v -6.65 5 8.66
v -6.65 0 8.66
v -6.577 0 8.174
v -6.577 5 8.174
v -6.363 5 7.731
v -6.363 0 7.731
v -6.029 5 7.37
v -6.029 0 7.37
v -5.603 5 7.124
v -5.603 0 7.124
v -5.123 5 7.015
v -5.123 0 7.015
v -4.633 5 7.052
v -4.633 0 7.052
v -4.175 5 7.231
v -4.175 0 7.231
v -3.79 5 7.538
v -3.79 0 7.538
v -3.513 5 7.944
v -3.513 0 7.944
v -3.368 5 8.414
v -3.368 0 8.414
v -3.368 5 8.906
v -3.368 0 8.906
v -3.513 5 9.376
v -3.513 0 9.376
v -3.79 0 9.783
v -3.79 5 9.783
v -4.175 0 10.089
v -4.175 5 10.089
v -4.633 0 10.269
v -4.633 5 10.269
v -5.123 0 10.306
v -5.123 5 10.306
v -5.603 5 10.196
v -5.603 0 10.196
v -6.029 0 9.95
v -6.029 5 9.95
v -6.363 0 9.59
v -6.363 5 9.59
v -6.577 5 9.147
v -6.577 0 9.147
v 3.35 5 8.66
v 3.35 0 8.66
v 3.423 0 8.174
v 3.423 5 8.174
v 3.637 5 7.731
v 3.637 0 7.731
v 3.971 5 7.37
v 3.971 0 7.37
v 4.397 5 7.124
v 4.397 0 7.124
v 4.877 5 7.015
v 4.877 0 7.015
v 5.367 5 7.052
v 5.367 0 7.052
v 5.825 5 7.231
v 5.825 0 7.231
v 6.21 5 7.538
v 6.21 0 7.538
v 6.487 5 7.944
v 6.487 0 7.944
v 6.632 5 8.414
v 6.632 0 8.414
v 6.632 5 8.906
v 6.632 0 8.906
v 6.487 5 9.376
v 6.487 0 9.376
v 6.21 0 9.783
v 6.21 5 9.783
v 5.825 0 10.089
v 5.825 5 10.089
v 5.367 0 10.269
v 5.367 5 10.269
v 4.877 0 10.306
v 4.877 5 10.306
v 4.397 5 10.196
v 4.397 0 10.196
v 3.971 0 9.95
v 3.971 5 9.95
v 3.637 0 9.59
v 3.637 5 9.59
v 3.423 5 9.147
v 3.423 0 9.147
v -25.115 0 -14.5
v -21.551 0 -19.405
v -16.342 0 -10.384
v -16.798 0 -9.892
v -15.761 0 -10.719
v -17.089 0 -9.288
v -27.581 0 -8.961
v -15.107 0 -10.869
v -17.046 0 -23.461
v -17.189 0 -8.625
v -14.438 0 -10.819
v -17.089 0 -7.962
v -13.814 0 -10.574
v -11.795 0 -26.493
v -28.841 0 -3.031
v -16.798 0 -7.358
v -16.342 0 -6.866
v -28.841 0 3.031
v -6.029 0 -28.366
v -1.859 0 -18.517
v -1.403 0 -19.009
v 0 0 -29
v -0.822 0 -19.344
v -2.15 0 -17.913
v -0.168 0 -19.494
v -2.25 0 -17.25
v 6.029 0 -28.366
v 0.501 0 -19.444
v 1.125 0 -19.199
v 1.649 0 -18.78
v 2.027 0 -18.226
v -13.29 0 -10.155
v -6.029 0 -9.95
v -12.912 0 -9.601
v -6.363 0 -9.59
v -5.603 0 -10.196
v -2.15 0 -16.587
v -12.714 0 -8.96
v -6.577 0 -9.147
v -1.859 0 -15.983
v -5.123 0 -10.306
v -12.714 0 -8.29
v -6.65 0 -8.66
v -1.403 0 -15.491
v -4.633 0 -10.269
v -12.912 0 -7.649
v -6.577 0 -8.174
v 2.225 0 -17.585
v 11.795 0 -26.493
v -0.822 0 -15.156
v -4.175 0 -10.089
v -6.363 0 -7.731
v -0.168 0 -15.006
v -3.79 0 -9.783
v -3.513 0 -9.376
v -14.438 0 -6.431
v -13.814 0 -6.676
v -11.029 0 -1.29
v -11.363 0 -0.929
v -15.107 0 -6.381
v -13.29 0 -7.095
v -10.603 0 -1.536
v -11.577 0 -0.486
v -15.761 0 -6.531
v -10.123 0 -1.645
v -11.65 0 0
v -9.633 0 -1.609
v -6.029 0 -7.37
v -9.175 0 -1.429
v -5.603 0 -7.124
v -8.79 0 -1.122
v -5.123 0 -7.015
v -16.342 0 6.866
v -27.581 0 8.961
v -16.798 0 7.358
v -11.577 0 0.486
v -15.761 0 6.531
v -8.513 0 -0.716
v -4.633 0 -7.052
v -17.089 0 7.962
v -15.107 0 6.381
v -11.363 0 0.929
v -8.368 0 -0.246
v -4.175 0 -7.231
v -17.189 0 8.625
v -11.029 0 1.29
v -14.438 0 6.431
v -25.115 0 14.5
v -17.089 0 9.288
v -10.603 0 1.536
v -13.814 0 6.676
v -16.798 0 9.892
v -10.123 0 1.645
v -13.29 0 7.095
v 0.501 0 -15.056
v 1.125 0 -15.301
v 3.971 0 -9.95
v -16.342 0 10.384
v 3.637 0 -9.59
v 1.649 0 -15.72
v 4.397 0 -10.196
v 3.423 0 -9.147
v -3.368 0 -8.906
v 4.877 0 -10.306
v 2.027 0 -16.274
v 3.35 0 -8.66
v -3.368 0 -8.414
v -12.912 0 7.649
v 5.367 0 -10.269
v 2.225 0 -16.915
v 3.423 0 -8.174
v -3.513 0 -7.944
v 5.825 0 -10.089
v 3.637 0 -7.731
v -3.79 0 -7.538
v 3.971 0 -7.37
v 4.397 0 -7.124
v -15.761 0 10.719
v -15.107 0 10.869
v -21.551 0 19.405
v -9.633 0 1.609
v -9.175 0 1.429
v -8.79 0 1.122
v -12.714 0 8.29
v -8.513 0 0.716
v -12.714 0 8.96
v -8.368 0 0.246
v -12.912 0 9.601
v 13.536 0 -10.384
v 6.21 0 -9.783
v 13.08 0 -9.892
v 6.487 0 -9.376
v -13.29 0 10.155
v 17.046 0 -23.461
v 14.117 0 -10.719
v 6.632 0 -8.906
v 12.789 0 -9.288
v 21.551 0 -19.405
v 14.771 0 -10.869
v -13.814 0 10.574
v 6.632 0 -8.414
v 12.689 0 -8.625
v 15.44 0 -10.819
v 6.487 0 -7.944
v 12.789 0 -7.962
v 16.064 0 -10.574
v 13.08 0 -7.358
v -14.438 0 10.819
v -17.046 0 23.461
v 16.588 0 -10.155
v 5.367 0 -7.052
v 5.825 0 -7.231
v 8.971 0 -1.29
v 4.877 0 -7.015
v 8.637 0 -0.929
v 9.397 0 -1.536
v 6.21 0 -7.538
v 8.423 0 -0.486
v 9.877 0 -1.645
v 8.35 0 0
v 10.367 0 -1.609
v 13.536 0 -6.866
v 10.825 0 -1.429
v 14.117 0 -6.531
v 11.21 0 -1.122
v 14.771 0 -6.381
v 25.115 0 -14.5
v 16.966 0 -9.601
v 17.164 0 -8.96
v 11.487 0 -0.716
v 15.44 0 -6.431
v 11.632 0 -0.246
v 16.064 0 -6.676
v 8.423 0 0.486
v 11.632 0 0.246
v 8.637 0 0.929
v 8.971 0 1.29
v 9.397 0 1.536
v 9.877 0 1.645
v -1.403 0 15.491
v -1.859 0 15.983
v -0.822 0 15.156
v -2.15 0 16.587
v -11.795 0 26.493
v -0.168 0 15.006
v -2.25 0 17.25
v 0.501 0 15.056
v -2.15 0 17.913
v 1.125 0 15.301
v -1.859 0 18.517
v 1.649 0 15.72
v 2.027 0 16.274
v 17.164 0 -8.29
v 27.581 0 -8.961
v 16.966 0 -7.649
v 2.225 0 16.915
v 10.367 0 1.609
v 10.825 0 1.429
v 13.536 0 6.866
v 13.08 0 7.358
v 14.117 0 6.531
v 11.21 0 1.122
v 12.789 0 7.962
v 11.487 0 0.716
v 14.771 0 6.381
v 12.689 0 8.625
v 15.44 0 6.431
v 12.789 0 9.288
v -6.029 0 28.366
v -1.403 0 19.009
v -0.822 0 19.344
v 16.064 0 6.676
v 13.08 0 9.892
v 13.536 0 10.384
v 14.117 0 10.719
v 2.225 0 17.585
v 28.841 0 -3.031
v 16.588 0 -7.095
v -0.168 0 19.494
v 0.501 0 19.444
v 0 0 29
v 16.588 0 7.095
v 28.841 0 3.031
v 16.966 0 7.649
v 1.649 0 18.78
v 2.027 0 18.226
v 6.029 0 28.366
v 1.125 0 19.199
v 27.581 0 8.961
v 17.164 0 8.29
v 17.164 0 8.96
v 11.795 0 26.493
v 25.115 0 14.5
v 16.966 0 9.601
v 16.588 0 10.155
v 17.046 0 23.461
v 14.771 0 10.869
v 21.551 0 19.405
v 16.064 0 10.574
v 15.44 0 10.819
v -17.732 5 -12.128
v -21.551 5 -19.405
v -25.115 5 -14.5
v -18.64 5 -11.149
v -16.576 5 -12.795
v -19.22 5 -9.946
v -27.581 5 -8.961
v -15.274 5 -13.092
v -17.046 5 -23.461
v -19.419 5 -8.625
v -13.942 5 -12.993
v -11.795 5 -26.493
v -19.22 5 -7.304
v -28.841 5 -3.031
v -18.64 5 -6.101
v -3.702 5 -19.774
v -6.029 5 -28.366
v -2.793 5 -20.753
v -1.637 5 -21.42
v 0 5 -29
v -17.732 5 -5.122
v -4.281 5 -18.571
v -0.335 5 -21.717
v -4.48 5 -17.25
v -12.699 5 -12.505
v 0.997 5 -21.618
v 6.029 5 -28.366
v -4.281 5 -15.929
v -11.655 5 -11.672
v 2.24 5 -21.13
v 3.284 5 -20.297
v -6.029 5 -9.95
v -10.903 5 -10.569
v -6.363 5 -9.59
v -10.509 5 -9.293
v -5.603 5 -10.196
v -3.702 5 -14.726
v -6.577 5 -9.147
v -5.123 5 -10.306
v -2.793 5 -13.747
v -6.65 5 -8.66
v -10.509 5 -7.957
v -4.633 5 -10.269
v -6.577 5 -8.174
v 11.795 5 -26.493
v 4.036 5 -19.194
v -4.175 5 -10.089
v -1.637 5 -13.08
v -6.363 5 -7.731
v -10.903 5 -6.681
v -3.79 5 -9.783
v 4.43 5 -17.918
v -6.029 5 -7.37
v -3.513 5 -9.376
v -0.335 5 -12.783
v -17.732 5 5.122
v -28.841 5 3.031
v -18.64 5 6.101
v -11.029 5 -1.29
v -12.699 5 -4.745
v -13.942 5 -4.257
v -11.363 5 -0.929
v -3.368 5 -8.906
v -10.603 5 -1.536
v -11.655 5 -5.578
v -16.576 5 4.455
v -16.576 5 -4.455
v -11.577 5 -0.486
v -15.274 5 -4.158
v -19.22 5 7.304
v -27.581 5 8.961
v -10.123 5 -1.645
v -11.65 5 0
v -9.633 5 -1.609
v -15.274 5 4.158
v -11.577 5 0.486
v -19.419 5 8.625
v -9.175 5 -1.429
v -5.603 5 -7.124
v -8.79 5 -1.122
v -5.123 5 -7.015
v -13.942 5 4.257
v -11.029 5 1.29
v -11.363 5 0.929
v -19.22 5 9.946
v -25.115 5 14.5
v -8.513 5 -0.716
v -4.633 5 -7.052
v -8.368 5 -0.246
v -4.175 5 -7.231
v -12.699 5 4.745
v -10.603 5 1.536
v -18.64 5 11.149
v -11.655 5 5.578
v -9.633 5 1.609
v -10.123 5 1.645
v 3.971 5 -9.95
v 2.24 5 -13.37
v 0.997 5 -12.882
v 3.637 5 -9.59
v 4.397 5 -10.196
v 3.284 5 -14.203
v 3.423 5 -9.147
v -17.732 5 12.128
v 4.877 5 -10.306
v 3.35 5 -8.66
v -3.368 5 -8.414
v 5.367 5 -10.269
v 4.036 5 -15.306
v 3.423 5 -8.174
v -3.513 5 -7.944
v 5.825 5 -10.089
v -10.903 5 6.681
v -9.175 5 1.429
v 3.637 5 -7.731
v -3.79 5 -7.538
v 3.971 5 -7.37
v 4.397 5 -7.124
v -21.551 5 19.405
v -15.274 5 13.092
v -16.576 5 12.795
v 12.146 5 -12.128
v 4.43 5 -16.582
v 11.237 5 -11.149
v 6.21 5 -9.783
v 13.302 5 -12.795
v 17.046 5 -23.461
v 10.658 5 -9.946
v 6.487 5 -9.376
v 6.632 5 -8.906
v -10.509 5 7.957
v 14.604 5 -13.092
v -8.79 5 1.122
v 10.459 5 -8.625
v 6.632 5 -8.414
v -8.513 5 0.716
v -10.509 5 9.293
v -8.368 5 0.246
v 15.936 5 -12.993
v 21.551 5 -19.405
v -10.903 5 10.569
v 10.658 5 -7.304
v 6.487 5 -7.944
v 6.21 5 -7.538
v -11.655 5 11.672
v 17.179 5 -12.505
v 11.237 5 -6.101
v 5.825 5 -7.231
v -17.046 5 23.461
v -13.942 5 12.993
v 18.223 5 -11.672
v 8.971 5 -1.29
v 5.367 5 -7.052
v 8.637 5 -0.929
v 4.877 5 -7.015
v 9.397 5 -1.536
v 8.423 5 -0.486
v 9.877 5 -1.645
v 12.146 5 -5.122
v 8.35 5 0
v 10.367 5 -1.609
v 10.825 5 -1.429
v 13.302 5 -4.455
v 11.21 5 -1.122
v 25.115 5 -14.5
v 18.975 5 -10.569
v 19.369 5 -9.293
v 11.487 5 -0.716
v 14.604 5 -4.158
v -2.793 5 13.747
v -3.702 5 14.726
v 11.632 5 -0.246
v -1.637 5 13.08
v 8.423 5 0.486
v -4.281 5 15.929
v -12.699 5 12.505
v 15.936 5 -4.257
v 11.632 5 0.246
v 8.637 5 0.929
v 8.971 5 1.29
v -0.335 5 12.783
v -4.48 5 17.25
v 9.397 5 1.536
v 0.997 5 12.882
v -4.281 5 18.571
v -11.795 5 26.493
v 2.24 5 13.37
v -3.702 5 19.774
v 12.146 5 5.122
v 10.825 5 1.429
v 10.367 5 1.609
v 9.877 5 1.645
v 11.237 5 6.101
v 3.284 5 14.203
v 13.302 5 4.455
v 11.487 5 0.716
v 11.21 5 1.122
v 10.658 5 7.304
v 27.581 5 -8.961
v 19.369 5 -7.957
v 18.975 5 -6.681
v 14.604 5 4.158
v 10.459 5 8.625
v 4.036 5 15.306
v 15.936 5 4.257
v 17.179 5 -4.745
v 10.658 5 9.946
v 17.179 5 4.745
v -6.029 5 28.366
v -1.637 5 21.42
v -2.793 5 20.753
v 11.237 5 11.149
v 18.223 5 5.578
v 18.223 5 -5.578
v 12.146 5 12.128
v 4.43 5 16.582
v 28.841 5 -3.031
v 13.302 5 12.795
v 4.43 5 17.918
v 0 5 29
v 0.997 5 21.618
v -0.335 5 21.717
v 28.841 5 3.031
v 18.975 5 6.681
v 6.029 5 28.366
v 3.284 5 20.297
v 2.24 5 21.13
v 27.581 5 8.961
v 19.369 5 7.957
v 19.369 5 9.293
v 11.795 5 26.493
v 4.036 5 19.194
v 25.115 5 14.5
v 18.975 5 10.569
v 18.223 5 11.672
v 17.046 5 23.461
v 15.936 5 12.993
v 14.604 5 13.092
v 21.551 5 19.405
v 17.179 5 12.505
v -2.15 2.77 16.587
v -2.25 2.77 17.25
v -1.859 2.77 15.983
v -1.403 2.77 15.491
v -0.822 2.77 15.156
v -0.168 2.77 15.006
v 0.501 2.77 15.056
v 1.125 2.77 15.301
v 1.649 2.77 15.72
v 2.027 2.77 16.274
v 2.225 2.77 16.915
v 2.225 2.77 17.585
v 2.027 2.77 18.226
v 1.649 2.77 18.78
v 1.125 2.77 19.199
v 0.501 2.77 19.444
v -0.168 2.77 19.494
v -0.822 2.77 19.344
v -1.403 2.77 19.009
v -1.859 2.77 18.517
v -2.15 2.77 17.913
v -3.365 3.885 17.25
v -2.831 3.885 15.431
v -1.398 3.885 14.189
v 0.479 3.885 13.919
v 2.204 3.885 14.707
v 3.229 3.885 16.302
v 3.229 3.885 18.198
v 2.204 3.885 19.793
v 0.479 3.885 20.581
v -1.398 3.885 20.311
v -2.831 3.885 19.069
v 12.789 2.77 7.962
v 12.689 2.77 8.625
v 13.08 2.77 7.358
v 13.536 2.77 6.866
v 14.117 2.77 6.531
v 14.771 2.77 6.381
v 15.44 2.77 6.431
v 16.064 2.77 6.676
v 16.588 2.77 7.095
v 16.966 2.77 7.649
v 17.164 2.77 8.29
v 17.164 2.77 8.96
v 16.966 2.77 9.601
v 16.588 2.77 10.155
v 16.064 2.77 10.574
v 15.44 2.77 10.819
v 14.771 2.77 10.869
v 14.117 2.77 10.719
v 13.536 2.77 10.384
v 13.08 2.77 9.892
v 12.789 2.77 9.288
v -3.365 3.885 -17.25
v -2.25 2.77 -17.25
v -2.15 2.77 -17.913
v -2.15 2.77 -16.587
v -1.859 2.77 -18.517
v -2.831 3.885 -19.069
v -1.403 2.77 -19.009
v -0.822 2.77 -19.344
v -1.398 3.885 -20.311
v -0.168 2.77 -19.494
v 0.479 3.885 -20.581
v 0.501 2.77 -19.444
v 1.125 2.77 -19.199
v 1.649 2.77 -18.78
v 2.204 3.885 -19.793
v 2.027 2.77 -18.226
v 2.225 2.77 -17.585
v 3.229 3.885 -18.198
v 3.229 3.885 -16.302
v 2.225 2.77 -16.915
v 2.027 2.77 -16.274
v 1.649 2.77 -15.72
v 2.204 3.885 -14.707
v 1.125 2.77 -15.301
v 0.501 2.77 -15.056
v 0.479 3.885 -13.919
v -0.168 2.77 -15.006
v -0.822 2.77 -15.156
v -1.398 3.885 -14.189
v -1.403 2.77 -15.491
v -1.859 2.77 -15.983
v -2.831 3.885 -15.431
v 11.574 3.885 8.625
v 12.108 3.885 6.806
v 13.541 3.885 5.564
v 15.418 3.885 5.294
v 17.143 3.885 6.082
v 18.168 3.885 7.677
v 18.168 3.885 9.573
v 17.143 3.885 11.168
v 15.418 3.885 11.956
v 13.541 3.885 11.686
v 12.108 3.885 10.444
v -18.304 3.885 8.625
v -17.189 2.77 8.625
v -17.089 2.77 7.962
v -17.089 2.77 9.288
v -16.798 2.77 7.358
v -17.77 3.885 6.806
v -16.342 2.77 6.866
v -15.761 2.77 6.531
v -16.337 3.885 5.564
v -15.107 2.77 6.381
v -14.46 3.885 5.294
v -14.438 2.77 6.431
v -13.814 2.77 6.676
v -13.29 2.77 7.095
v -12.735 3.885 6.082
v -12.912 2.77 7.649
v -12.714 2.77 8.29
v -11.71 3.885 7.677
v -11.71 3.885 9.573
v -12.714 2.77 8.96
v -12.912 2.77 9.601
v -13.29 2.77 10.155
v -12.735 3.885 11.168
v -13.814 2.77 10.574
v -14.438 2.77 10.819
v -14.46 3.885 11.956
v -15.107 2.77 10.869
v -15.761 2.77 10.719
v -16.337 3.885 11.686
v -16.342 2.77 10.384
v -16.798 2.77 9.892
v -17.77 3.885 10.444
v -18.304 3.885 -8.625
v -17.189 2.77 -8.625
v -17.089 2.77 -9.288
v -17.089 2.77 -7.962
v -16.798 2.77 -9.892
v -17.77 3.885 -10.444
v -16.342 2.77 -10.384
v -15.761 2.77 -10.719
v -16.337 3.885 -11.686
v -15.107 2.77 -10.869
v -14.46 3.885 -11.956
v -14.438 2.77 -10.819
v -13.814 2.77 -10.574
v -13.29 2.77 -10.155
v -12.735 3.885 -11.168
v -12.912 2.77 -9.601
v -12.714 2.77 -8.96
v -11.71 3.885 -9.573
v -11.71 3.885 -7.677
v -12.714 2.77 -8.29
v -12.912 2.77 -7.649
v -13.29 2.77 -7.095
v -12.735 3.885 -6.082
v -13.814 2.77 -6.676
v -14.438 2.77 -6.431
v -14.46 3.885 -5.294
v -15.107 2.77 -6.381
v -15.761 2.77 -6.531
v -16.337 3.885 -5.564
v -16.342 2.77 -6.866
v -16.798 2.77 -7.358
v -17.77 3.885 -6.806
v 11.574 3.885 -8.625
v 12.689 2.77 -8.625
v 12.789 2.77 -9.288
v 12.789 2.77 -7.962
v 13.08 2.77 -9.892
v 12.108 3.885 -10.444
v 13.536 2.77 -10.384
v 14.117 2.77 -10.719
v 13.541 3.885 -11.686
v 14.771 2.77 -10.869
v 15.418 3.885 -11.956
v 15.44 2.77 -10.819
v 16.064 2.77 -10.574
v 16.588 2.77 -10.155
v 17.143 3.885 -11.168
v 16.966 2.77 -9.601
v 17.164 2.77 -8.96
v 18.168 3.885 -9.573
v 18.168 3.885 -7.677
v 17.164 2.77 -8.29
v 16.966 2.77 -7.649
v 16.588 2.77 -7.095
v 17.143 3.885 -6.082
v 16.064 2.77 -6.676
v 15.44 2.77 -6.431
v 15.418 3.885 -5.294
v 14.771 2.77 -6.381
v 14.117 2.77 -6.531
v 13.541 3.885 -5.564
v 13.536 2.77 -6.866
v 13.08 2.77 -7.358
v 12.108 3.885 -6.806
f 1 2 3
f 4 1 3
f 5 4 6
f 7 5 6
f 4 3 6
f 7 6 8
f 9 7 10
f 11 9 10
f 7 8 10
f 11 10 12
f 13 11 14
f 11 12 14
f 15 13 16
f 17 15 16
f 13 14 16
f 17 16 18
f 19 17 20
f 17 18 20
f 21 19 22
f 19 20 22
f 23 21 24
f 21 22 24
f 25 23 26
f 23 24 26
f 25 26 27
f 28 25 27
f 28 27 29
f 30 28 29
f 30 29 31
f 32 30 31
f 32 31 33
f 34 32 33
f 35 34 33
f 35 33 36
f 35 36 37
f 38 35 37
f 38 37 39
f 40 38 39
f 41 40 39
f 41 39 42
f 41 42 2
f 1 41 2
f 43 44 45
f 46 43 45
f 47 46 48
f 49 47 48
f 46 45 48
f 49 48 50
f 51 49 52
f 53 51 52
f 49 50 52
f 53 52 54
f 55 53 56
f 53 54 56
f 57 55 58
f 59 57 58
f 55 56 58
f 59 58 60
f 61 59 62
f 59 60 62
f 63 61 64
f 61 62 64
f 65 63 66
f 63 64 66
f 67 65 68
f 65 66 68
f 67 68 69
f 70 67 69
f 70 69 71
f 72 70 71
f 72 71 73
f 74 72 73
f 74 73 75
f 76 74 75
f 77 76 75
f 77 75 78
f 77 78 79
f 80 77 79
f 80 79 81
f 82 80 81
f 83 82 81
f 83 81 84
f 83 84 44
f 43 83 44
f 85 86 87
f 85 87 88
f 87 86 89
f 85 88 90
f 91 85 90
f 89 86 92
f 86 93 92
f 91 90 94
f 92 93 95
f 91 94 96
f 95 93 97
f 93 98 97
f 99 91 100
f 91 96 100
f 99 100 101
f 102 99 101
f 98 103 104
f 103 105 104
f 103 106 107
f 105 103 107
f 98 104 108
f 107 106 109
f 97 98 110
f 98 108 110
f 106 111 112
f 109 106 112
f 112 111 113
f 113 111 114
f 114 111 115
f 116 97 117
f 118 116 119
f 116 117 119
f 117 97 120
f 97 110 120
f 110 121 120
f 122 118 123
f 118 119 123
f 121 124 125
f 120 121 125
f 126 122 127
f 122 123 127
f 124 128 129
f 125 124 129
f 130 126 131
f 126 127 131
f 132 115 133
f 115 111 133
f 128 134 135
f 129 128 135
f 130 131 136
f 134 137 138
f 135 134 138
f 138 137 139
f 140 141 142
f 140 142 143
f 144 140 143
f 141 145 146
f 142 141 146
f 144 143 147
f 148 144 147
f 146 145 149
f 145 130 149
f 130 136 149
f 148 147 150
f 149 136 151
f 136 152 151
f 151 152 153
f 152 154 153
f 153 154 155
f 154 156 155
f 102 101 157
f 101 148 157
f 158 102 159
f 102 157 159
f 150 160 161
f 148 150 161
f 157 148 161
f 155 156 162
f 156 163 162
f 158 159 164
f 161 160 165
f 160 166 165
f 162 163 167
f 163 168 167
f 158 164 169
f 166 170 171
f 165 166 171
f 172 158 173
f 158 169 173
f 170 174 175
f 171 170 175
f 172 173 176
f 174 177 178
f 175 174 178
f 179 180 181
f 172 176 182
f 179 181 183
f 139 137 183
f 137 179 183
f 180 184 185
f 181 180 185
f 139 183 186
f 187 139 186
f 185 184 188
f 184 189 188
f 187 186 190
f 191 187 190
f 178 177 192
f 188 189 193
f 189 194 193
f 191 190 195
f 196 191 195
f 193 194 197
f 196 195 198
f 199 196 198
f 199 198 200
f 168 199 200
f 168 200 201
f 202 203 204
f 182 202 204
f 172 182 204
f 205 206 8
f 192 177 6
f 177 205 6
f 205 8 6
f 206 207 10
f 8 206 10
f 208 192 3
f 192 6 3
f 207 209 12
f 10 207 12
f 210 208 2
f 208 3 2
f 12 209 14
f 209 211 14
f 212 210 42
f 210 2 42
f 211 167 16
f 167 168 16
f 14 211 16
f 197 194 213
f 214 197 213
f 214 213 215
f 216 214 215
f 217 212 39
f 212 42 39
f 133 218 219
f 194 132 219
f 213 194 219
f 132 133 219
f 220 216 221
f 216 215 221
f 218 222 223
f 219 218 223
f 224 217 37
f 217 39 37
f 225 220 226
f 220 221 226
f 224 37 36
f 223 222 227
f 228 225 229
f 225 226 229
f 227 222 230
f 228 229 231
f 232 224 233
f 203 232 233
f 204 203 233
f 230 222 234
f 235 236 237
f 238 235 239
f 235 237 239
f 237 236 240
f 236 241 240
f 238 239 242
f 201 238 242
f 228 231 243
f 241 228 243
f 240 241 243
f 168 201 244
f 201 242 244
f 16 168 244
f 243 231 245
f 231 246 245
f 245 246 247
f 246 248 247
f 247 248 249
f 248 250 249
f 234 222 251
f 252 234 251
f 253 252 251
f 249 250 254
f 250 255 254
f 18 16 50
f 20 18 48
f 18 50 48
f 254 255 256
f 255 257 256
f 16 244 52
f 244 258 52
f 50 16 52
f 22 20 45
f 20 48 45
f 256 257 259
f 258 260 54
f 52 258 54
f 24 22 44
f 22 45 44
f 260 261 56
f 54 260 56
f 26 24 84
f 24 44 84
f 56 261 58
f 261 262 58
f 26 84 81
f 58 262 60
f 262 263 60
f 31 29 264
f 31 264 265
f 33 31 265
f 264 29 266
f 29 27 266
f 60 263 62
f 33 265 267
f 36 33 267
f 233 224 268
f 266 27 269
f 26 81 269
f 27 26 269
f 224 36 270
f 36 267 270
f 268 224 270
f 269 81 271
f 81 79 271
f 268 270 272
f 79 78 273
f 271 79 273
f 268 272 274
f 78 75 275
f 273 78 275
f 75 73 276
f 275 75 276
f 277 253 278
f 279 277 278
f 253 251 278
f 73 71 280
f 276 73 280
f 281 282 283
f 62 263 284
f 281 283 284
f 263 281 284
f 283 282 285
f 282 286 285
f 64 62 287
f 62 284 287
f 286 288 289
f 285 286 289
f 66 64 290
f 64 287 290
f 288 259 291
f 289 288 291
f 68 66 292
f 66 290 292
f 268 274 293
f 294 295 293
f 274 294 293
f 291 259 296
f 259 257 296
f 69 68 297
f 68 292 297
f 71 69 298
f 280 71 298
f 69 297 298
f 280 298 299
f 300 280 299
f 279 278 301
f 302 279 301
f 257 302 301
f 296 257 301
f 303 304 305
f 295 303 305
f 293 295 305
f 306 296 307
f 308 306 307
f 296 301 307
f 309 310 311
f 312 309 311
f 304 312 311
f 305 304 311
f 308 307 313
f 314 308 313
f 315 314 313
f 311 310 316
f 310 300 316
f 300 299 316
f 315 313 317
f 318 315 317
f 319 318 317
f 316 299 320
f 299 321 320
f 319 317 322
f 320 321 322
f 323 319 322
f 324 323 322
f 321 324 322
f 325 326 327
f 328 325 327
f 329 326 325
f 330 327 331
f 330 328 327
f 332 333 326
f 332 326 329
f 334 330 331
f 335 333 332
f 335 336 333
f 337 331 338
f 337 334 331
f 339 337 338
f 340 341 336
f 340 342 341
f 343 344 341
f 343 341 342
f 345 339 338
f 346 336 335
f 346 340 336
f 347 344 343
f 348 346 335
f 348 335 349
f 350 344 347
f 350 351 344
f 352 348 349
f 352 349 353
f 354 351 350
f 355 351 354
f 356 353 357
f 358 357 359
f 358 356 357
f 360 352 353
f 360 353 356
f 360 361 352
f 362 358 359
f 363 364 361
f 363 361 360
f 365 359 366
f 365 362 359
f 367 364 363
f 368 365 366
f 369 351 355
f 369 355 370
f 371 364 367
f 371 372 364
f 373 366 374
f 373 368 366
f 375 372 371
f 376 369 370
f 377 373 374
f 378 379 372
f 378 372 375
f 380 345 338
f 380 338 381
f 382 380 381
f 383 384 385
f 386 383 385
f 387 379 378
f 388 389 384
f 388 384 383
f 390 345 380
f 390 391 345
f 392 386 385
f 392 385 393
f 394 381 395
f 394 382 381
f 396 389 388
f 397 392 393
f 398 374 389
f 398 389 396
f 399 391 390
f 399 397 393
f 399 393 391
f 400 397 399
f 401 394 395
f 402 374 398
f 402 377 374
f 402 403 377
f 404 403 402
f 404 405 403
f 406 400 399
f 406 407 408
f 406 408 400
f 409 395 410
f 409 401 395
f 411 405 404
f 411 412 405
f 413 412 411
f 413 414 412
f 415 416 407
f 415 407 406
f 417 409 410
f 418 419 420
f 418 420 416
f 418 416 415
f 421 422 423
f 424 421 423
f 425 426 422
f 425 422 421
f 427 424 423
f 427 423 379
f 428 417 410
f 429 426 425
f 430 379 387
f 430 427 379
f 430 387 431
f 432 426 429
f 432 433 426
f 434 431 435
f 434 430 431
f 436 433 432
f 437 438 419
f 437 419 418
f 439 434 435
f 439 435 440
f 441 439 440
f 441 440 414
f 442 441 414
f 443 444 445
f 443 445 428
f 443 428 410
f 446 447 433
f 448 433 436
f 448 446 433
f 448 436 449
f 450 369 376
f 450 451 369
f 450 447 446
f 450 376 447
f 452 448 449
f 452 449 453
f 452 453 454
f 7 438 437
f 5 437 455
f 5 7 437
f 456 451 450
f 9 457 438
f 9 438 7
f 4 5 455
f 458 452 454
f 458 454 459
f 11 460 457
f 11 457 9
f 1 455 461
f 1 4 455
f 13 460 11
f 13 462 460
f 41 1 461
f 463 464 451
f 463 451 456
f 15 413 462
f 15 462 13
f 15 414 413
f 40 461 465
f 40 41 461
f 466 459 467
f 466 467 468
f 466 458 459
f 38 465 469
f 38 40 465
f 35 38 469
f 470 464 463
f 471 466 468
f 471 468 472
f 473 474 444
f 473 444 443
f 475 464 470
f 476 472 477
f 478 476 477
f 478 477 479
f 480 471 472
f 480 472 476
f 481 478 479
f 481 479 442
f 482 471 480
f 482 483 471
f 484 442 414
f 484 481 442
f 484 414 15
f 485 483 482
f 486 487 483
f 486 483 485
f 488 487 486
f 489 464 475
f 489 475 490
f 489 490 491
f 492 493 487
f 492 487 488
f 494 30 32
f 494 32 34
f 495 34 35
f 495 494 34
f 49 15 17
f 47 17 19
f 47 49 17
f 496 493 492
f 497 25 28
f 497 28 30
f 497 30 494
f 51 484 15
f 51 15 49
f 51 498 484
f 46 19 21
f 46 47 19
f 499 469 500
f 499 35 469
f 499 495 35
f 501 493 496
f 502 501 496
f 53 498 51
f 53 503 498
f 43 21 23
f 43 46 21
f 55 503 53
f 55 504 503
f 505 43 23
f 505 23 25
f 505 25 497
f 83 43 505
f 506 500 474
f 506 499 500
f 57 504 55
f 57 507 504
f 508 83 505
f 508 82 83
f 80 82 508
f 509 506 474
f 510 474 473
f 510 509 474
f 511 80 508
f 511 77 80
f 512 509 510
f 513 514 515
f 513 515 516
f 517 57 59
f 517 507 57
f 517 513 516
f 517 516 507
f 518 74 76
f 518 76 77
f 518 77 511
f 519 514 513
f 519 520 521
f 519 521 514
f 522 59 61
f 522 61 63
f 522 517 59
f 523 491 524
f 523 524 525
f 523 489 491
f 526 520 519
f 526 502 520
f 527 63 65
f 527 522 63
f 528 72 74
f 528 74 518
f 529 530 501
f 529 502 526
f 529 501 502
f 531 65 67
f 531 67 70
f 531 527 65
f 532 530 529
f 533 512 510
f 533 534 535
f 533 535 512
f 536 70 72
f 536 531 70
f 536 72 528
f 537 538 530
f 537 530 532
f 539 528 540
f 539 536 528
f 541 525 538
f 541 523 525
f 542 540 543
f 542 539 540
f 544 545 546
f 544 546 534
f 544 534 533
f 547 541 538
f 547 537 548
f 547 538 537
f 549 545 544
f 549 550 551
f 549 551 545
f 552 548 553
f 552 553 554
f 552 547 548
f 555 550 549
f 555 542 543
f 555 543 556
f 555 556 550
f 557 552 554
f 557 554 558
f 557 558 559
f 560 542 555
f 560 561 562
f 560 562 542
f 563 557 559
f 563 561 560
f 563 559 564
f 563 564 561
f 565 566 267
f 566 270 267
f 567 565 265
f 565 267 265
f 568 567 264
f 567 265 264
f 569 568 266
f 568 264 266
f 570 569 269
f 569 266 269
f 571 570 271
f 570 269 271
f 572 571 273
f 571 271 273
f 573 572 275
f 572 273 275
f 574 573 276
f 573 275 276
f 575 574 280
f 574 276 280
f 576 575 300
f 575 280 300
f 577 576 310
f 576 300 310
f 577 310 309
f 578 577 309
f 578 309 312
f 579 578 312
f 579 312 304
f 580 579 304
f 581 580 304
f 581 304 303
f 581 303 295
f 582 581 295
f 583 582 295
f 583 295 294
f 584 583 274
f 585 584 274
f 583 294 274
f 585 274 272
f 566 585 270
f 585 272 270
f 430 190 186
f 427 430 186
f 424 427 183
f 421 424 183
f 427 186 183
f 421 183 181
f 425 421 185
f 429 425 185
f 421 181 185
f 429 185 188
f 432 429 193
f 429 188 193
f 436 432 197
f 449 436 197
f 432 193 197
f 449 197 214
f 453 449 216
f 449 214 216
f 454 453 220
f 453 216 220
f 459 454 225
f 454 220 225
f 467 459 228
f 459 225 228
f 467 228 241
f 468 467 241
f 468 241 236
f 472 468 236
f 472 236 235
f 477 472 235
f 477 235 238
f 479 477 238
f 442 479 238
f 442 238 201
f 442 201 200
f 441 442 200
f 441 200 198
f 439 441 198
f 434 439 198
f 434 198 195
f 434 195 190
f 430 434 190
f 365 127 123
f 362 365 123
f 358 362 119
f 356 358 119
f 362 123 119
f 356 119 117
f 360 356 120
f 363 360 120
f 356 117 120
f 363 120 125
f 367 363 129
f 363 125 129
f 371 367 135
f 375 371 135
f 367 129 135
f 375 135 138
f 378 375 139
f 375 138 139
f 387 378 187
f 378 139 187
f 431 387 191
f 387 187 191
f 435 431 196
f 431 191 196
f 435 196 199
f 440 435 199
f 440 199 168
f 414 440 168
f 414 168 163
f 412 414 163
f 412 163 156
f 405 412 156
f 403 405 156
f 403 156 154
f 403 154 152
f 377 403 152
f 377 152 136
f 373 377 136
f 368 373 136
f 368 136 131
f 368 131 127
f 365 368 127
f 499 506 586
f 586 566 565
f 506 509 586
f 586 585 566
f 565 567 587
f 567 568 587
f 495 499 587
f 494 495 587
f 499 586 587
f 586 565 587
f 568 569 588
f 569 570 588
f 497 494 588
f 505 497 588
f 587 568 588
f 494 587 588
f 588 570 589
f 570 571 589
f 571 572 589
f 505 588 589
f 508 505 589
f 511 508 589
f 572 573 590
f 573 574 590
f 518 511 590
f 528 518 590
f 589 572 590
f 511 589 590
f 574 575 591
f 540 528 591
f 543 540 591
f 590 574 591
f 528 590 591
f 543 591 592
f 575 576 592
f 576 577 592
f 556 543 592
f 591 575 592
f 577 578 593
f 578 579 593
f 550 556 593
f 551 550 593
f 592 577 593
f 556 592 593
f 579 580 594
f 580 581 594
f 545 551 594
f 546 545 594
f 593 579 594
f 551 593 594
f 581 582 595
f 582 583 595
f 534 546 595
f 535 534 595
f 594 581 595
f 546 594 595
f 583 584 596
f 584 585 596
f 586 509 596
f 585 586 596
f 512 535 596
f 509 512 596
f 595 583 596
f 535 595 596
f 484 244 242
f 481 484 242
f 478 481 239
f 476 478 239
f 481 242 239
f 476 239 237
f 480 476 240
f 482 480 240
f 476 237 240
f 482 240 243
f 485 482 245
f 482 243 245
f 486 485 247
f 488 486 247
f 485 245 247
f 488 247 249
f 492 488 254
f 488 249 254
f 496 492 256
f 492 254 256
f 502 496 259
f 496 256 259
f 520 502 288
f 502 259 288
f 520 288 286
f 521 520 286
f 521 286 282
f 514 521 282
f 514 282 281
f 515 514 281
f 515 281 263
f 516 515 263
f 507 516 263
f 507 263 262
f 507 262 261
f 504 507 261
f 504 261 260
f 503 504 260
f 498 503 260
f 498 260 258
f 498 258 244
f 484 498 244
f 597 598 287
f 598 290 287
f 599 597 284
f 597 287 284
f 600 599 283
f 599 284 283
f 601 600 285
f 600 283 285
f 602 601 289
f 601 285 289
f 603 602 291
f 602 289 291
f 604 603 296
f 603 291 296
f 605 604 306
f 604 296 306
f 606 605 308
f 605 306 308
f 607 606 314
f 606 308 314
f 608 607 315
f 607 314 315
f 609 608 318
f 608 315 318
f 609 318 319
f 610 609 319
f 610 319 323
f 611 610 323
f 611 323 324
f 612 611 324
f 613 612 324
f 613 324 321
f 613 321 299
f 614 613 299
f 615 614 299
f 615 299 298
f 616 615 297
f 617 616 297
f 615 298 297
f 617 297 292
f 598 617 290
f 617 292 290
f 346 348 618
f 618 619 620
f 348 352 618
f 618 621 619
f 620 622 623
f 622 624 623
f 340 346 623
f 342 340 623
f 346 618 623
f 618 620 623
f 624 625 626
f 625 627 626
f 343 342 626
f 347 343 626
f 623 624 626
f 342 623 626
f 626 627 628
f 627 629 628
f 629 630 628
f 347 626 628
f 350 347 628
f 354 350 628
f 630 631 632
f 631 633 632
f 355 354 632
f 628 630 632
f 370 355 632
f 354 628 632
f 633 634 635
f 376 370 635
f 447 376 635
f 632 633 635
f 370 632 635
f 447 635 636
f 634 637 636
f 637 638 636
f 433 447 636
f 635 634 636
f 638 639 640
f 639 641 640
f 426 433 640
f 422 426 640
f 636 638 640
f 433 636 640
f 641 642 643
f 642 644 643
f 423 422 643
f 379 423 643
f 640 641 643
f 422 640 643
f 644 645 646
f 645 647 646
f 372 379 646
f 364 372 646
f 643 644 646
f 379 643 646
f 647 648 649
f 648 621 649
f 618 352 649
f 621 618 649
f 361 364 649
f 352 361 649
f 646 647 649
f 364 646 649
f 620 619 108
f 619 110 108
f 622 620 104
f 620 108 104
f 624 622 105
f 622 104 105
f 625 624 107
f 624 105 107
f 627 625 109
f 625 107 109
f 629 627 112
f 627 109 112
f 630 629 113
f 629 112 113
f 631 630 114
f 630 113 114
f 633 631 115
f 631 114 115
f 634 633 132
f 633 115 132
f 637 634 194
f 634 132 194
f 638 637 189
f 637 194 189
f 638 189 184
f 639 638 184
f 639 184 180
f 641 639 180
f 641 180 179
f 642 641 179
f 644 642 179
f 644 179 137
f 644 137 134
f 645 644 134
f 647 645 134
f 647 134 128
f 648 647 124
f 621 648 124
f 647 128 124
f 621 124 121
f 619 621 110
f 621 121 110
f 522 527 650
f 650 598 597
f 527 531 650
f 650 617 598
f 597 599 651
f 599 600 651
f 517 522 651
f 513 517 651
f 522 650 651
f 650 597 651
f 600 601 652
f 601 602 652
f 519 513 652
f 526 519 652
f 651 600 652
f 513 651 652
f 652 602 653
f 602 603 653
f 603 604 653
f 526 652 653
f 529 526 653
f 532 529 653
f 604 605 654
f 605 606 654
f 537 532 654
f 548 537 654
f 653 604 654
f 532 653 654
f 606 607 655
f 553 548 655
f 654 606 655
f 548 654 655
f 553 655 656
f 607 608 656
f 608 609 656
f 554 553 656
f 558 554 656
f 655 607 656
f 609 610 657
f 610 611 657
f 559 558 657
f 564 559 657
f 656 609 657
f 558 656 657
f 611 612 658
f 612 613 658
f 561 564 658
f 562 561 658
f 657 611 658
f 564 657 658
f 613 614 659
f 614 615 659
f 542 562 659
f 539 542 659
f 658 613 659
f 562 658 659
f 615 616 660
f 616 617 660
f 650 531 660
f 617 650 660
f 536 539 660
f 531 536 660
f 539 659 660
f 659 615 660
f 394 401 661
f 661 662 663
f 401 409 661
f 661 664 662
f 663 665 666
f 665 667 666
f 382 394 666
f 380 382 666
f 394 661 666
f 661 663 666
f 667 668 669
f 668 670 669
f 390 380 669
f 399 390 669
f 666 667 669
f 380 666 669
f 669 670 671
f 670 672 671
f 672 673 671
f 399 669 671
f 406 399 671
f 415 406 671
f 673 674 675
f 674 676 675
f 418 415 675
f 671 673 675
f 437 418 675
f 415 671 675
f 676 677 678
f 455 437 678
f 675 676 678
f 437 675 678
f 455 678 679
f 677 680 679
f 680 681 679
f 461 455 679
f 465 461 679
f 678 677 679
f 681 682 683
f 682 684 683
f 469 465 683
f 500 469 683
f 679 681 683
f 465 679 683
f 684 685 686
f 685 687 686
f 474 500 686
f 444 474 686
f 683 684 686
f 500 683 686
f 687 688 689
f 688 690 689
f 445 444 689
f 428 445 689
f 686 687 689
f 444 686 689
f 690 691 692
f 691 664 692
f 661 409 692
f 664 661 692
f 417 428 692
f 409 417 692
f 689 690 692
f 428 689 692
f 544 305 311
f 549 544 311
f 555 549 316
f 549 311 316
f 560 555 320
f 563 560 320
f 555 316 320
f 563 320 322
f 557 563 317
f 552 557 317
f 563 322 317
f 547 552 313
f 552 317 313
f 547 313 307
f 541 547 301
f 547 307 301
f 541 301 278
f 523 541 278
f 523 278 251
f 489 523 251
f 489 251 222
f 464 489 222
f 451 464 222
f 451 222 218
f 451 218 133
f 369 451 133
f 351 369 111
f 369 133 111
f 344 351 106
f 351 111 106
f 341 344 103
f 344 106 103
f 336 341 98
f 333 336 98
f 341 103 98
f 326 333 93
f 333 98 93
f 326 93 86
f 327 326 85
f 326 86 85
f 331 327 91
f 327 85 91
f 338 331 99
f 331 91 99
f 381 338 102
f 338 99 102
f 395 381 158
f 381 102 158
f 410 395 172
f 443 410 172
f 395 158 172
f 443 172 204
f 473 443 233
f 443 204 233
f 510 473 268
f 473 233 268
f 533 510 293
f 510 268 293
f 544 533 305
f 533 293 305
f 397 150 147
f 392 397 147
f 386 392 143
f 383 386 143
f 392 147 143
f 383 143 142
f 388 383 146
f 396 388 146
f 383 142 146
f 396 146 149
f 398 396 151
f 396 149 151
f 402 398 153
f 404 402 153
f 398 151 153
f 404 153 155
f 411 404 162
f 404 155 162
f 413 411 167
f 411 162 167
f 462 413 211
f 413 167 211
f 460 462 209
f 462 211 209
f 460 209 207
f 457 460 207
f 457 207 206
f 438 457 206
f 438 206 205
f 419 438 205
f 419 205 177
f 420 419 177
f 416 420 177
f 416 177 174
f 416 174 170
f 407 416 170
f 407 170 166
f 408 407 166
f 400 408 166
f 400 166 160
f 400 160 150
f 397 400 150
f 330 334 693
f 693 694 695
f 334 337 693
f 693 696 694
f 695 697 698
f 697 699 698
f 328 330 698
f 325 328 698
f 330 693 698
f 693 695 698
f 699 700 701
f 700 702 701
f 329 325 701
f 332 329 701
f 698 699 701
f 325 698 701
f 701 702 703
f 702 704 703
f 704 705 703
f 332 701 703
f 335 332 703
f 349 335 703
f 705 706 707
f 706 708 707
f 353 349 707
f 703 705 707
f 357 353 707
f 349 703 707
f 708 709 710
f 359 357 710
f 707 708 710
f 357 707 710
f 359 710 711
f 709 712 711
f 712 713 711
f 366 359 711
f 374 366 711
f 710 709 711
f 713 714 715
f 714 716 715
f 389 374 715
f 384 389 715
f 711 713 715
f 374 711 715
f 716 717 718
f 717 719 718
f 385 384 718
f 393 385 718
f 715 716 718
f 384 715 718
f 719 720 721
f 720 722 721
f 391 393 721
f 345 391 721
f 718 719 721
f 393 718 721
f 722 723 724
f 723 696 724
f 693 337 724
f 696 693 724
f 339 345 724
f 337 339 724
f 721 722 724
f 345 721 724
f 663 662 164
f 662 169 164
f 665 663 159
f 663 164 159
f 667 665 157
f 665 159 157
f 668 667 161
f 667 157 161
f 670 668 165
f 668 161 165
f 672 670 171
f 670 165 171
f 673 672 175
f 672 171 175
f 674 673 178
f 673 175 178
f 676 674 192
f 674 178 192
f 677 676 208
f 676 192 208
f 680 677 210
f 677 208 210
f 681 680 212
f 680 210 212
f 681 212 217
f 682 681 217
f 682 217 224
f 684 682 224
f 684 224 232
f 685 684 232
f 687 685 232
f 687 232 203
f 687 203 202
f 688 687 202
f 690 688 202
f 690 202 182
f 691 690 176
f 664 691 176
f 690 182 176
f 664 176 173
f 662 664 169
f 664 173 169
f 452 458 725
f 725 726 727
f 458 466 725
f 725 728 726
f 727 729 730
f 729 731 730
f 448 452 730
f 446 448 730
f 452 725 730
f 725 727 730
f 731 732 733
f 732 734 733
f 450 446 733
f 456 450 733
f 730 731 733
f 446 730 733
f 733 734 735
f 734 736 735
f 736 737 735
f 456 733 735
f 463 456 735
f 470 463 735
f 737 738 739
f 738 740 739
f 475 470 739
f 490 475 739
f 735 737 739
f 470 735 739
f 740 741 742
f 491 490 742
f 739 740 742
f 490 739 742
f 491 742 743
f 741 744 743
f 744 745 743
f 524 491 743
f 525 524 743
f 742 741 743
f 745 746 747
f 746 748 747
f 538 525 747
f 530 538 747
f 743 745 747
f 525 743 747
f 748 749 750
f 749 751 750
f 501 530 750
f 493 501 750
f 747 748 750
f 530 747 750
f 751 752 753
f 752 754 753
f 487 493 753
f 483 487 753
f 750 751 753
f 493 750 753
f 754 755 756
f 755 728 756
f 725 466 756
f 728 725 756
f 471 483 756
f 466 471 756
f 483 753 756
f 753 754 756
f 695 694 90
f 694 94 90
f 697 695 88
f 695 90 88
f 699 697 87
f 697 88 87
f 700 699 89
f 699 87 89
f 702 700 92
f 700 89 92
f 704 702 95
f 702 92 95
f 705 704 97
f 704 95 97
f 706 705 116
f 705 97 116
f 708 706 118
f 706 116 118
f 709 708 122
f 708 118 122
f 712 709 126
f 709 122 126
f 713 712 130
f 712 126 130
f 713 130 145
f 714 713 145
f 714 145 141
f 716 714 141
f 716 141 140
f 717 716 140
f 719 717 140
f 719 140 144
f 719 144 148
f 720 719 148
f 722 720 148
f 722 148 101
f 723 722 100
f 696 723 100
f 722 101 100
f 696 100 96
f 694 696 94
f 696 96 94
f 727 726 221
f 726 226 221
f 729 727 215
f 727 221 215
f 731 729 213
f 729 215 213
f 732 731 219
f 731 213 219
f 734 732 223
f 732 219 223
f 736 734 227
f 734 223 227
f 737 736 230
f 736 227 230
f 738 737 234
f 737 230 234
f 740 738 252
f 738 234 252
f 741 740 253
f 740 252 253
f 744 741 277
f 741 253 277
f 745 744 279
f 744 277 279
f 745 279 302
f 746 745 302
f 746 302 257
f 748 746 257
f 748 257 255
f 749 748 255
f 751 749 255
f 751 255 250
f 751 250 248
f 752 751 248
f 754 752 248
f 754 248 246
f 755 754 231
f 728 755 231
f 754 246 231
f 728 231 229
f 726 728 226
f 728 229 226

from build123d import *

# Parameters (mm, degrees)
SKIZZE1_R                                            = 29
AUFSATZ_LINEAR_AUSTRAGEN1_DEPTH                      = 5
FORMSENKUNG_F_R_M4_SENKSCHRAUBE_MIT_INNE_D           = 4.5
FORMSENKUNG_F_R_M4_SENKSCHRAUBE_MIT_INNE_CSINK_D     = 8.96
FORMSENKUNG_F_R_M4_SENKSCHRAUBE_MIT_INNE_CSINK_ANGLE = 90
M4_GEWINDEBOHRUNG1_D                                 = 3.3


with BuildPart() as part:
    # Skizze1 → Aufsatz-Linear austragen1 (new body)
    with BuildSketch(Plane(origin=(0, 0, 0), x_dir=(1, 0, 0), z_dir=(0, 1, 0))):
        with Locations(Location((0, 0, 0), (0, 0, 270))):
            Circle(SKIZZE1_R)
    extrude(amount=AUFSATZ_LINEAR_AUSTRAGEN1_DEPTH)

    # Formsenkung für M4 Senkschraube mit Innensechskant1 (through all)
    with Locations(Plane(origin=(0, 5, 0), x_dir=(1, 0, 0), z_dir=(0, 1, 0))):
        with Locations((-14.938938215, 8.625), (0, 17.25), (14.938938215, 8.625), (14.938938215, -8.625), (0, -17.25), (-14.938938215, -8.625)):
            CounterSinkHole(FORMSENKUNG_F_R_M4_SENKSCHRAUBE_MIT_INNE_D / 2, FORMSENKUNG_F_R_M4_SENKSCHRAUBE_MIT_INNE_CSINK_D / 2, counter_sink_angle=FORMSENKUNG_F_R_M4_SENKSCHRAUBE_MIT_INNE_CSINK_ANGLE)

    # M4 Gewindebohrung1 (through all)
    with Locations(Plane(origin=(0, 5, 0), x_dir=(1, 0, 0), z_dir=(0, 1, 0))):
        with Locations((-10, 0), (-5, 8.660254038), (5, 8.660254038), (10, 0), (5, -8.660254038), (-5, -8.660254038)):
            Hole(M4_GEWINDEBOHRUNG1_D / 2)


solid = part.part
